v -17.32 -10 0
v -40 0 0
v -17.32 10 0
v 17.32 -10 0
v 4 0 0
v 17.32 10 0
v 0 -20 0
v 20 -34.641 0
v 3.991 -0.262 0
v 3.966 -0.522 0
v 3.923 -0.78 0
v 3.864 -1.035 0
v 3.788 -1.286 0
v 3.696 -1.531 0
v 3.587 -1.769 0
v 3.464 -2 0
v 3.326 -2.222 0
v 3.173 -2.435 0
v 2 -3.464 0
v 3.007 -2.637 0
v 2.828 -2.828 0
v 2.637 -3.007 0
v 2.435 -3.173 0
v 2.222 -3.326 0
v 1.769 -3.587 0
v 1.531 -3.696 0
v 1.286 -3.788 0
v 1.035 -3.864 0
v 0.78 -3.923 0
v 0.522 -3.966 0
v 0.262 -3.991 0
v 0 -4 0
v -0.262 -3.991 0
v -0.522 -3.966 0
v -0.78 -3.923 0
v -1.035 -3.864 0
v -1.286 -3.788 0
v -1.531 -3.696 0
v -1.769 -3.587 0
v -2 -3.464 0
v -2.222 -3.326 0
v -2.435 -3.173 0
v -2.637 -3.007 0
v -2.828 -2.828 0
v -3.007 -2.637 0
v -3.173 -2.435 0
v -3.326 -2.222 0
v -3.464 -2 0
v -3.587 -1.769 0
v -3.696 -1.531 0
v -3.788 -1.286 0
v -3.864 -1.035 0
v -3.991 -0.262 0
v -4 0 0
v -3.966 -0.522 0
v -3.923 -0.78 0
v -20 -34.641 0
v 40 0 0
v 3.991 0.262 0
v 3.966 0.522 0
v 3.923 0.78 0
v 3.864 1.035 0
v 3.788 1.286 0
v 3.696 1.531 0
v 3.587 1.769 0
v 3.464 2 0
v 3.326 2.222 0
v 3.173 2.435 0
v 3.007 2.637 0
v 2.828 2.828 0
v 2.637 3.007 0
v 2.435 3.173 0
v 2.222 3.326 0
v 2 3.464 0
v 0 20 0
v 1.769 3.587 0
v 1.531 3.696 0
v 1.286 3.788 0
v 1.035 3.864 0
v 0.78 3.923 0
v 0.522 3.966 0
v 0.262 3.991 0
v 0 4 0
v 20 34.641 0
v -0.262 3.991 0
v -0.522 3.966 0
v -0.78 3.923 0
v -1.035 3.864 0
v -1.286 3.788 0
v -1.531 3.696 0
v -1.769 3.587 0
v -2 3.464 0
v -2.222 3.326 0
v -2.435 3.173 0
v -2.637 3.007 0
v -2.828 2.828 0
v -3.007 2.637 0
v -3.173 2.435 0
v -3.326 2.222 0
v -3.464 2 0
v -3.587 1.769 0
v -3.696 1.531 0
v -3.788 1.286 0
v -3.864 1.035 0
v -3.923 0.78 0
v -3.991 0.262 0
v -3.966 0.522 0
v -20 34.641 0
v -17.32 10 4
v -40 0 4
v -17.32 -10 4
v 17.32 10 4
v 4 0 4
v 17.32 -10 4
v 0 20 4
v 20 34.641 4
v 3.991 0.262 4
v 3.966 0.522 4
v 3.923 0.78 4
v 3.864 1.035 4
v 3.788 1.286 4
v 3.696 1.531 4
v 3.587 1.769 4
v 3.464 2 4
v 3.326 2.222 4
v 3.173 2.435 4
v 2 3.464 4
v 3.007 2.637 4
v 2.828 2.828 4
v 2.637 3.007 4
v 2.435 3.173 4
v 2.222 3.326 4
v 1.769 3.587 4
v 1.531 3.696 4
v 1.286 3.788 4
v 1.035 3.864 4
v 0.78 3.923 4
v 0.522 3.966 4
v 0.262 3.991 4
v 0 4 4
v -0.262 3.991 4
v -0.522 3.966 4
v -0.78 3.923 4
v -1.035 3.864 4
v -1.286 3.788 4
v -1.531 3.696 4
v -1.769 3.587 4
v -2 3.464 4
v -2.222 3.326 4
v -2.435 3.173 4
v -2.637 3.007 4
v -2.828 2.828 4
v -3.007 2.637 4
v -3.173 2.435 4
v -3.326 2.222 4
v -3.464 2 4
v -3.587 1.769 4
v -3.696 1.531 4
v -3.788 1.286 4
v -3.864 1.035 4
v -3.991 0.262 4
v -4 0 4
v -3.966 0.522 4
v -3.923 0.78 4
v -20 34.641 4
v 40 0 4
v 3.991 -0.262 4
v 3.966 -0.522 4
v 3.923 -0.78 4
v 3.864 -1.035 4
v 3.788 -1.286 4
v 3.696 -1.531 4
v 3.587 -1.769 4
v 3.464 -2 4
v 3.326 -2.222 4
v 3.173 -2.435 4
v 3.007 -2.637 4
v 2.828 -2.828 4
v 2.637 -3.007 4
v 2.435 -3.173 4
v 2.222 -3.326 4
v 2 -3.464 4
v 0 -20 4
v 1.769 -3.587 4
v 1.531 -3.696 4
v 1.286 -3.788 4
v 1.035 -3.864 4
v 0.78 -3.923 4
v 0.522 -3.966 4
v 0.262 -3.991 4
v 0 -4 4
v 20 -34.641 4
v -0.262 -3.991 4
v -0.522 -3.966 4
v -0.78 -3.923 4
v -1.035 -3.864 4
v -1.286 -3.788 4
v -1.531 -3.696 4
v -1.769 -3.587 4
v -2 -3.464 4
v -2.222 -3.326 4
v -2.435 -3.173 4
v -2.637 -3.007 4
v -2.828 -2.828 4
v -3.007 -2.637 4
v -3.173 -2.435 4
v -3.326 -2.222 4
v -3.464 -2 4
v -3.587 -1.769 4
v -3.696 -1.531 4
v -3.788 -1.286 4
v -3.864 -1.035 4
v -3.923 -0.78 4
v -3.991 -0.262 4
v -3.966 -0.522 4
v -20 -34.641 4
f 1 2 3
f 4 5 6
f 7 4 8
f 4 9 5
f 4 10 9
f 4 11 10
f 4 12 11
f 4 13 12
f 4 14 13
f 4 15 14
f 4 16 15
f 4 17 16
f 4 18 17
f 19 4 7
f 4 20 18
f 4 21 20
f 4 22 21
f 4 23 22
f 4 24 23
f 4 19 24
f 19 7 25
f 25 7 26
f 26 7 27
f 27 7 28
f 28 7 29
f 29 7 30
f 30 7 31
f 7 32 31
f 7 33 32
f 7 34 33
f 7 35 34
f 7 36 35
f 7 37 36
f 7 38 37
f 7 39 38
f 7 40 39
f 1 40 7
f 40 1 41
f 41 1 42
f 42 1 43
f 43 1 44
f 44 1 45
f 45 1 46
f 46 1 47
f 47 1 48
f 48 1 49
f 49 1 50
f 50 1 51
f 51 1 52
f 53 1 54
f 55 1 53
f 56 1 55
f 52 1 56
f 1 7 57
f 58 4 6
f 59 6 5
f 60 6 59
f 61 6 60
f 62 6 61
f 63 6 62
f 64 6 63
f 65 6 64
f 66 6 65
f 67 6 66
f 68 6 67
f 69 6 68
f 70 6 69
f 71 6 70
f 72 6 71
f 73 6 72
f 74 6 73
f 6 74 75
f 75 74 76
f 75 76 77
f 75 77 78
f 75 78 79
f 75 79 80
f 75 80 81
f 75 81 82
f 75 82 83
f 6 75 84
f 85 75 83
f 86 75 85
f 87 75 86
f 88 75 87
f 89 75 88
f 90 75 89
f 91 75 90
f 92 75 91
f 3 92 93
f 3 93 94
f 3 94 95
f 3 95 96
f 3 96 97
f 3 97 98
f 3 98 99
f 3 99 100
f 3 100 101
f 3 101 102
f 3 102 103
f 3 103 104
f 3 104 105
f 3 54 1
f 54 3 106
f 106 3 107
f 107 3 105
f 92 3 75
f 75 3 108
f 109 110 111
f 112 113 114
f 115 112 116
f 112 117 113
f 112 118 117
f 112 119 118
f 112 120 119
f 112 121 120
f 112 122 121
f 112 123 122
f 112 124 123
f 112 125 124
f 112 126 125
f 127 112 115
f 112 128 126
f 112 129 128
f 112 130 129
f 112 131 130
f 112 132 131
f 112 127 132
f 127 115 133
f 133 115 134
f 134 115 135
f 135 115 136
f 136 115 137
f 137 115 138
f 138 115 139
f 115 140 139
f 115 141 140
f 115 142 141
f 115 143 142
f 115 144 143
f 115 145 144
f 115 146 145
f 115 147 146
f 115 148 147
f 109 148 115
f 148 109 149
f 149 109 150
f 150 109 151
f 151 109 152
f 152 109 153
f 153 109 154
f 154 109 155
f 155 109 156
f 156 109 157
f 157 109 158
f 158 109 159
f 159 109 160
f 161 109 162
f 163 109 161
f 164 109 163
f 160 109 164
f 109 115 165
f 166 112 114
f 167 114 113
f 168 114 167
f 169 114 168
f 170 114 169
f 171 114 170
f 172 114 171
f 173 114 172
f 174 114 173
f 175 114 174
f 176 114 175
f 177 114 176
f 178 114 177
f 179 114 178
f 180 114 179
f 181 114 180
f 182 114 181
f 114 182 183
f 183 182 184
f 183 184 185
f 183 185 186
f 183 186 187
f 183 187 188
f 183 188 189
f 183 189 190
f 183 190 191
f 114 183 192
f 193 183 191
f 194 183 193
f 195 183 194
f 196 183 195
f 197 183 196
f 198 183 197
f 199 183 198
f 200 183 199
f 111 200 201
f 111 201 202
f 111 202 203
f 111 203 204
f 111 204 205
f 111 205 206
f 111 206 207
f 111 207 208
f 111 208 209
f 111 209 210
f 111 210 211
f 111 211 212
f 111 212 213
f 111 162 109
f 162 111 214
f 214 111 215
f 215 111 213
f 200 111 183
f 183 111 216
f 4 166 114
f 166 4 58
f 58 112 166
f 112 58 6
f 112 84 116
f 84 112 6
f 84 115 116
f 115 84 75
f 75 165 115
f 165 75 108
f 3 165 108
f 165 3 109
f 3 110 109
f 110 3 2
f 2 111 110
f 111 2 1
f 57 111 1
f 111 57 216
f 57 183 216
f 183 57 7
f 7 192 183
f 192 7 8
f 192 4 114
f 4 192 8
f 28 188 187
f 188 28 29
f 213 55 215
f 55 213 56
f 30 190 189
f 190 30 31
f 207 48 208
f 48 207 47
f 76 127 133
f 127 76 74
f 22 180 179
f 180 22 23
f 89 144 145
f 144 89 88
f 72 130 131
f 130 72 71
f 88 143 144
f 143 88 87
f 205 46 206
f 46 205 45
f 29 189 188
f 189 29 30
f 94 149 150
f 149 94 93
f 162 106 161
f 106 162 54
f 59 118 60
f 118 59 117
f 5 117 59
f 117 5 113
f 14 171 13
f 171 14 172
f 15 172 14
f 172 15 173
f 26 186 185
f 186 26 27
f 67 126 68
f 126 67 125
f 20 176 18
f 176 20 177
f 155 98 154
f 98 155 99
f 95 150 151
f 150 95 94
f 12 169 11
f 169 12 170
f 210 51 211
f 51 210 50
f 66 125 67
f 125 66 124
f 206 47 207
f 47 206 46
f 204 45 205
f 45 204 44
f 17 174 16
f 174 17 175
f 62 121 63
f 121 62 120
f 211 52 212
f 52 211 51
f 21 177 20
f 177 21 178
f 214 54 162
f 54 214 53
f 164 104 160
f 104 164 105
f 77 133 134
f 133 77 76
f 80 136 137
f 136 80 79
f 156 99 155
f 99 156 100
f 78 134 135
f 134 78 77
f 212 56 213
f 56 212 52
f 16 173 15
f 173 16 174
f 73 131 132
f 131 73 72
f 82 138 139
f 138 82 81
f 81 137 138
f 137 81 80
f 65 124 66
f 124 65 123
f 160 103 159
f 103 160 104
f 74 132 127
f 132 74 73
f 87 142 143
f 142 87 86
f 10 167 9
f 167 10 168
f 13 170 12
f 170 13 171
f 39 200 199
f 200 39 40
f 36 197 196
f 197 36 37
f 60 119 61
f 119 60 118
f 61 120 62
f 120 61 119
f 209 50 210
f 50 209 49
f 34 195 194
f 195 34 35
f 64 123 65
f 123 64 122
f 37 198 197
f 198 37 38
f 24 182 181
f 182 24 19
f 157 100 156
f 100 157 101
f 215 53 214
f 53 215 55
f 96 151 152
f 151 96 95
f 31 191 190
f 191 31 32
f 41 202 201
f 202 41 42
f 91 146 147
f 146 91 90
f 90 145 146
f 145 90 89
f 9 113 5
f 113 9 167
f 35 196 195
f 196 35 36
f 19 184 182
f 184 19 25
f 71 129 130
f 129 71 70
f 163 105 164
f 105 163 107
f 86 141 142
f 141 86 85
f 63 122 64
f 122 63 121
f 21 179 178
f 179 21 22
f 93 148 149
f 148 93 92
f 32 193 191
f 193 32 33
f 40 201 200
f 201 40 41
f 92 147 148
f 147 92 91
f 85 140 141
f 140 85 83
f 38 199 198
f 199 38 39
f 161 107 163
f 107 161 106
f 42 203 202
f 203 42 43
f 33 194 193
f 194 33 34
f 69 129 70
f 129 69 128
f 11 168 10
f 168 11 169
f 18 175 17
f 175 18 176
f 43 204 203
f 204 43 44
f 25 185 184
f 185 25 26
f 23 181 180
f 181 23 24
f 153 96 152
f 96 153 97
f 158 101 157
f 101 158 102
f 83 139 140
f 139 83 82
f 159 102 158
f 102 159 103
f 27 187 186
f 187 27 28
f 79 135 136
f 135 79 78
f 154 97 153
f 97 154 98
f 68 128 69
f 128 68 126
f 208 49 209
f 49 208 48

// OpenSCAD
// Star-shaped indexing wheel (6-pointed star plate)

n_points   = 6;    // number of star points
r_outer    = 40;   // radius of outer points (mm)
r_inner    = 20;   // radius of inner points (mm)
thickness  = 4;    // plate thickness (mm)
hole_d     = 8;    // central through-hole diameter (mm)
cut_extra  = 0.5;  // extra length for cutting shapes past faces (mm)

$fn = 96;

// Star outline: alternating outer/inner vertices, first outer point on +X
star_pts = [
    for (i = [0 : 2 * n_points - 1])
        let (r = (i % 2 == 0) ? r_outer : r_inner,
             a = i * 180 / n_points)
        [r * cos(a), r * sin(a)]
];

difference() {
    linear_extrude(height = thickness)
        polygon(star_pts);

    translate([0, 0, -cut_extra])
        cylinder(d = hole_d, h = thickness + 2 * cut_extra);
}
